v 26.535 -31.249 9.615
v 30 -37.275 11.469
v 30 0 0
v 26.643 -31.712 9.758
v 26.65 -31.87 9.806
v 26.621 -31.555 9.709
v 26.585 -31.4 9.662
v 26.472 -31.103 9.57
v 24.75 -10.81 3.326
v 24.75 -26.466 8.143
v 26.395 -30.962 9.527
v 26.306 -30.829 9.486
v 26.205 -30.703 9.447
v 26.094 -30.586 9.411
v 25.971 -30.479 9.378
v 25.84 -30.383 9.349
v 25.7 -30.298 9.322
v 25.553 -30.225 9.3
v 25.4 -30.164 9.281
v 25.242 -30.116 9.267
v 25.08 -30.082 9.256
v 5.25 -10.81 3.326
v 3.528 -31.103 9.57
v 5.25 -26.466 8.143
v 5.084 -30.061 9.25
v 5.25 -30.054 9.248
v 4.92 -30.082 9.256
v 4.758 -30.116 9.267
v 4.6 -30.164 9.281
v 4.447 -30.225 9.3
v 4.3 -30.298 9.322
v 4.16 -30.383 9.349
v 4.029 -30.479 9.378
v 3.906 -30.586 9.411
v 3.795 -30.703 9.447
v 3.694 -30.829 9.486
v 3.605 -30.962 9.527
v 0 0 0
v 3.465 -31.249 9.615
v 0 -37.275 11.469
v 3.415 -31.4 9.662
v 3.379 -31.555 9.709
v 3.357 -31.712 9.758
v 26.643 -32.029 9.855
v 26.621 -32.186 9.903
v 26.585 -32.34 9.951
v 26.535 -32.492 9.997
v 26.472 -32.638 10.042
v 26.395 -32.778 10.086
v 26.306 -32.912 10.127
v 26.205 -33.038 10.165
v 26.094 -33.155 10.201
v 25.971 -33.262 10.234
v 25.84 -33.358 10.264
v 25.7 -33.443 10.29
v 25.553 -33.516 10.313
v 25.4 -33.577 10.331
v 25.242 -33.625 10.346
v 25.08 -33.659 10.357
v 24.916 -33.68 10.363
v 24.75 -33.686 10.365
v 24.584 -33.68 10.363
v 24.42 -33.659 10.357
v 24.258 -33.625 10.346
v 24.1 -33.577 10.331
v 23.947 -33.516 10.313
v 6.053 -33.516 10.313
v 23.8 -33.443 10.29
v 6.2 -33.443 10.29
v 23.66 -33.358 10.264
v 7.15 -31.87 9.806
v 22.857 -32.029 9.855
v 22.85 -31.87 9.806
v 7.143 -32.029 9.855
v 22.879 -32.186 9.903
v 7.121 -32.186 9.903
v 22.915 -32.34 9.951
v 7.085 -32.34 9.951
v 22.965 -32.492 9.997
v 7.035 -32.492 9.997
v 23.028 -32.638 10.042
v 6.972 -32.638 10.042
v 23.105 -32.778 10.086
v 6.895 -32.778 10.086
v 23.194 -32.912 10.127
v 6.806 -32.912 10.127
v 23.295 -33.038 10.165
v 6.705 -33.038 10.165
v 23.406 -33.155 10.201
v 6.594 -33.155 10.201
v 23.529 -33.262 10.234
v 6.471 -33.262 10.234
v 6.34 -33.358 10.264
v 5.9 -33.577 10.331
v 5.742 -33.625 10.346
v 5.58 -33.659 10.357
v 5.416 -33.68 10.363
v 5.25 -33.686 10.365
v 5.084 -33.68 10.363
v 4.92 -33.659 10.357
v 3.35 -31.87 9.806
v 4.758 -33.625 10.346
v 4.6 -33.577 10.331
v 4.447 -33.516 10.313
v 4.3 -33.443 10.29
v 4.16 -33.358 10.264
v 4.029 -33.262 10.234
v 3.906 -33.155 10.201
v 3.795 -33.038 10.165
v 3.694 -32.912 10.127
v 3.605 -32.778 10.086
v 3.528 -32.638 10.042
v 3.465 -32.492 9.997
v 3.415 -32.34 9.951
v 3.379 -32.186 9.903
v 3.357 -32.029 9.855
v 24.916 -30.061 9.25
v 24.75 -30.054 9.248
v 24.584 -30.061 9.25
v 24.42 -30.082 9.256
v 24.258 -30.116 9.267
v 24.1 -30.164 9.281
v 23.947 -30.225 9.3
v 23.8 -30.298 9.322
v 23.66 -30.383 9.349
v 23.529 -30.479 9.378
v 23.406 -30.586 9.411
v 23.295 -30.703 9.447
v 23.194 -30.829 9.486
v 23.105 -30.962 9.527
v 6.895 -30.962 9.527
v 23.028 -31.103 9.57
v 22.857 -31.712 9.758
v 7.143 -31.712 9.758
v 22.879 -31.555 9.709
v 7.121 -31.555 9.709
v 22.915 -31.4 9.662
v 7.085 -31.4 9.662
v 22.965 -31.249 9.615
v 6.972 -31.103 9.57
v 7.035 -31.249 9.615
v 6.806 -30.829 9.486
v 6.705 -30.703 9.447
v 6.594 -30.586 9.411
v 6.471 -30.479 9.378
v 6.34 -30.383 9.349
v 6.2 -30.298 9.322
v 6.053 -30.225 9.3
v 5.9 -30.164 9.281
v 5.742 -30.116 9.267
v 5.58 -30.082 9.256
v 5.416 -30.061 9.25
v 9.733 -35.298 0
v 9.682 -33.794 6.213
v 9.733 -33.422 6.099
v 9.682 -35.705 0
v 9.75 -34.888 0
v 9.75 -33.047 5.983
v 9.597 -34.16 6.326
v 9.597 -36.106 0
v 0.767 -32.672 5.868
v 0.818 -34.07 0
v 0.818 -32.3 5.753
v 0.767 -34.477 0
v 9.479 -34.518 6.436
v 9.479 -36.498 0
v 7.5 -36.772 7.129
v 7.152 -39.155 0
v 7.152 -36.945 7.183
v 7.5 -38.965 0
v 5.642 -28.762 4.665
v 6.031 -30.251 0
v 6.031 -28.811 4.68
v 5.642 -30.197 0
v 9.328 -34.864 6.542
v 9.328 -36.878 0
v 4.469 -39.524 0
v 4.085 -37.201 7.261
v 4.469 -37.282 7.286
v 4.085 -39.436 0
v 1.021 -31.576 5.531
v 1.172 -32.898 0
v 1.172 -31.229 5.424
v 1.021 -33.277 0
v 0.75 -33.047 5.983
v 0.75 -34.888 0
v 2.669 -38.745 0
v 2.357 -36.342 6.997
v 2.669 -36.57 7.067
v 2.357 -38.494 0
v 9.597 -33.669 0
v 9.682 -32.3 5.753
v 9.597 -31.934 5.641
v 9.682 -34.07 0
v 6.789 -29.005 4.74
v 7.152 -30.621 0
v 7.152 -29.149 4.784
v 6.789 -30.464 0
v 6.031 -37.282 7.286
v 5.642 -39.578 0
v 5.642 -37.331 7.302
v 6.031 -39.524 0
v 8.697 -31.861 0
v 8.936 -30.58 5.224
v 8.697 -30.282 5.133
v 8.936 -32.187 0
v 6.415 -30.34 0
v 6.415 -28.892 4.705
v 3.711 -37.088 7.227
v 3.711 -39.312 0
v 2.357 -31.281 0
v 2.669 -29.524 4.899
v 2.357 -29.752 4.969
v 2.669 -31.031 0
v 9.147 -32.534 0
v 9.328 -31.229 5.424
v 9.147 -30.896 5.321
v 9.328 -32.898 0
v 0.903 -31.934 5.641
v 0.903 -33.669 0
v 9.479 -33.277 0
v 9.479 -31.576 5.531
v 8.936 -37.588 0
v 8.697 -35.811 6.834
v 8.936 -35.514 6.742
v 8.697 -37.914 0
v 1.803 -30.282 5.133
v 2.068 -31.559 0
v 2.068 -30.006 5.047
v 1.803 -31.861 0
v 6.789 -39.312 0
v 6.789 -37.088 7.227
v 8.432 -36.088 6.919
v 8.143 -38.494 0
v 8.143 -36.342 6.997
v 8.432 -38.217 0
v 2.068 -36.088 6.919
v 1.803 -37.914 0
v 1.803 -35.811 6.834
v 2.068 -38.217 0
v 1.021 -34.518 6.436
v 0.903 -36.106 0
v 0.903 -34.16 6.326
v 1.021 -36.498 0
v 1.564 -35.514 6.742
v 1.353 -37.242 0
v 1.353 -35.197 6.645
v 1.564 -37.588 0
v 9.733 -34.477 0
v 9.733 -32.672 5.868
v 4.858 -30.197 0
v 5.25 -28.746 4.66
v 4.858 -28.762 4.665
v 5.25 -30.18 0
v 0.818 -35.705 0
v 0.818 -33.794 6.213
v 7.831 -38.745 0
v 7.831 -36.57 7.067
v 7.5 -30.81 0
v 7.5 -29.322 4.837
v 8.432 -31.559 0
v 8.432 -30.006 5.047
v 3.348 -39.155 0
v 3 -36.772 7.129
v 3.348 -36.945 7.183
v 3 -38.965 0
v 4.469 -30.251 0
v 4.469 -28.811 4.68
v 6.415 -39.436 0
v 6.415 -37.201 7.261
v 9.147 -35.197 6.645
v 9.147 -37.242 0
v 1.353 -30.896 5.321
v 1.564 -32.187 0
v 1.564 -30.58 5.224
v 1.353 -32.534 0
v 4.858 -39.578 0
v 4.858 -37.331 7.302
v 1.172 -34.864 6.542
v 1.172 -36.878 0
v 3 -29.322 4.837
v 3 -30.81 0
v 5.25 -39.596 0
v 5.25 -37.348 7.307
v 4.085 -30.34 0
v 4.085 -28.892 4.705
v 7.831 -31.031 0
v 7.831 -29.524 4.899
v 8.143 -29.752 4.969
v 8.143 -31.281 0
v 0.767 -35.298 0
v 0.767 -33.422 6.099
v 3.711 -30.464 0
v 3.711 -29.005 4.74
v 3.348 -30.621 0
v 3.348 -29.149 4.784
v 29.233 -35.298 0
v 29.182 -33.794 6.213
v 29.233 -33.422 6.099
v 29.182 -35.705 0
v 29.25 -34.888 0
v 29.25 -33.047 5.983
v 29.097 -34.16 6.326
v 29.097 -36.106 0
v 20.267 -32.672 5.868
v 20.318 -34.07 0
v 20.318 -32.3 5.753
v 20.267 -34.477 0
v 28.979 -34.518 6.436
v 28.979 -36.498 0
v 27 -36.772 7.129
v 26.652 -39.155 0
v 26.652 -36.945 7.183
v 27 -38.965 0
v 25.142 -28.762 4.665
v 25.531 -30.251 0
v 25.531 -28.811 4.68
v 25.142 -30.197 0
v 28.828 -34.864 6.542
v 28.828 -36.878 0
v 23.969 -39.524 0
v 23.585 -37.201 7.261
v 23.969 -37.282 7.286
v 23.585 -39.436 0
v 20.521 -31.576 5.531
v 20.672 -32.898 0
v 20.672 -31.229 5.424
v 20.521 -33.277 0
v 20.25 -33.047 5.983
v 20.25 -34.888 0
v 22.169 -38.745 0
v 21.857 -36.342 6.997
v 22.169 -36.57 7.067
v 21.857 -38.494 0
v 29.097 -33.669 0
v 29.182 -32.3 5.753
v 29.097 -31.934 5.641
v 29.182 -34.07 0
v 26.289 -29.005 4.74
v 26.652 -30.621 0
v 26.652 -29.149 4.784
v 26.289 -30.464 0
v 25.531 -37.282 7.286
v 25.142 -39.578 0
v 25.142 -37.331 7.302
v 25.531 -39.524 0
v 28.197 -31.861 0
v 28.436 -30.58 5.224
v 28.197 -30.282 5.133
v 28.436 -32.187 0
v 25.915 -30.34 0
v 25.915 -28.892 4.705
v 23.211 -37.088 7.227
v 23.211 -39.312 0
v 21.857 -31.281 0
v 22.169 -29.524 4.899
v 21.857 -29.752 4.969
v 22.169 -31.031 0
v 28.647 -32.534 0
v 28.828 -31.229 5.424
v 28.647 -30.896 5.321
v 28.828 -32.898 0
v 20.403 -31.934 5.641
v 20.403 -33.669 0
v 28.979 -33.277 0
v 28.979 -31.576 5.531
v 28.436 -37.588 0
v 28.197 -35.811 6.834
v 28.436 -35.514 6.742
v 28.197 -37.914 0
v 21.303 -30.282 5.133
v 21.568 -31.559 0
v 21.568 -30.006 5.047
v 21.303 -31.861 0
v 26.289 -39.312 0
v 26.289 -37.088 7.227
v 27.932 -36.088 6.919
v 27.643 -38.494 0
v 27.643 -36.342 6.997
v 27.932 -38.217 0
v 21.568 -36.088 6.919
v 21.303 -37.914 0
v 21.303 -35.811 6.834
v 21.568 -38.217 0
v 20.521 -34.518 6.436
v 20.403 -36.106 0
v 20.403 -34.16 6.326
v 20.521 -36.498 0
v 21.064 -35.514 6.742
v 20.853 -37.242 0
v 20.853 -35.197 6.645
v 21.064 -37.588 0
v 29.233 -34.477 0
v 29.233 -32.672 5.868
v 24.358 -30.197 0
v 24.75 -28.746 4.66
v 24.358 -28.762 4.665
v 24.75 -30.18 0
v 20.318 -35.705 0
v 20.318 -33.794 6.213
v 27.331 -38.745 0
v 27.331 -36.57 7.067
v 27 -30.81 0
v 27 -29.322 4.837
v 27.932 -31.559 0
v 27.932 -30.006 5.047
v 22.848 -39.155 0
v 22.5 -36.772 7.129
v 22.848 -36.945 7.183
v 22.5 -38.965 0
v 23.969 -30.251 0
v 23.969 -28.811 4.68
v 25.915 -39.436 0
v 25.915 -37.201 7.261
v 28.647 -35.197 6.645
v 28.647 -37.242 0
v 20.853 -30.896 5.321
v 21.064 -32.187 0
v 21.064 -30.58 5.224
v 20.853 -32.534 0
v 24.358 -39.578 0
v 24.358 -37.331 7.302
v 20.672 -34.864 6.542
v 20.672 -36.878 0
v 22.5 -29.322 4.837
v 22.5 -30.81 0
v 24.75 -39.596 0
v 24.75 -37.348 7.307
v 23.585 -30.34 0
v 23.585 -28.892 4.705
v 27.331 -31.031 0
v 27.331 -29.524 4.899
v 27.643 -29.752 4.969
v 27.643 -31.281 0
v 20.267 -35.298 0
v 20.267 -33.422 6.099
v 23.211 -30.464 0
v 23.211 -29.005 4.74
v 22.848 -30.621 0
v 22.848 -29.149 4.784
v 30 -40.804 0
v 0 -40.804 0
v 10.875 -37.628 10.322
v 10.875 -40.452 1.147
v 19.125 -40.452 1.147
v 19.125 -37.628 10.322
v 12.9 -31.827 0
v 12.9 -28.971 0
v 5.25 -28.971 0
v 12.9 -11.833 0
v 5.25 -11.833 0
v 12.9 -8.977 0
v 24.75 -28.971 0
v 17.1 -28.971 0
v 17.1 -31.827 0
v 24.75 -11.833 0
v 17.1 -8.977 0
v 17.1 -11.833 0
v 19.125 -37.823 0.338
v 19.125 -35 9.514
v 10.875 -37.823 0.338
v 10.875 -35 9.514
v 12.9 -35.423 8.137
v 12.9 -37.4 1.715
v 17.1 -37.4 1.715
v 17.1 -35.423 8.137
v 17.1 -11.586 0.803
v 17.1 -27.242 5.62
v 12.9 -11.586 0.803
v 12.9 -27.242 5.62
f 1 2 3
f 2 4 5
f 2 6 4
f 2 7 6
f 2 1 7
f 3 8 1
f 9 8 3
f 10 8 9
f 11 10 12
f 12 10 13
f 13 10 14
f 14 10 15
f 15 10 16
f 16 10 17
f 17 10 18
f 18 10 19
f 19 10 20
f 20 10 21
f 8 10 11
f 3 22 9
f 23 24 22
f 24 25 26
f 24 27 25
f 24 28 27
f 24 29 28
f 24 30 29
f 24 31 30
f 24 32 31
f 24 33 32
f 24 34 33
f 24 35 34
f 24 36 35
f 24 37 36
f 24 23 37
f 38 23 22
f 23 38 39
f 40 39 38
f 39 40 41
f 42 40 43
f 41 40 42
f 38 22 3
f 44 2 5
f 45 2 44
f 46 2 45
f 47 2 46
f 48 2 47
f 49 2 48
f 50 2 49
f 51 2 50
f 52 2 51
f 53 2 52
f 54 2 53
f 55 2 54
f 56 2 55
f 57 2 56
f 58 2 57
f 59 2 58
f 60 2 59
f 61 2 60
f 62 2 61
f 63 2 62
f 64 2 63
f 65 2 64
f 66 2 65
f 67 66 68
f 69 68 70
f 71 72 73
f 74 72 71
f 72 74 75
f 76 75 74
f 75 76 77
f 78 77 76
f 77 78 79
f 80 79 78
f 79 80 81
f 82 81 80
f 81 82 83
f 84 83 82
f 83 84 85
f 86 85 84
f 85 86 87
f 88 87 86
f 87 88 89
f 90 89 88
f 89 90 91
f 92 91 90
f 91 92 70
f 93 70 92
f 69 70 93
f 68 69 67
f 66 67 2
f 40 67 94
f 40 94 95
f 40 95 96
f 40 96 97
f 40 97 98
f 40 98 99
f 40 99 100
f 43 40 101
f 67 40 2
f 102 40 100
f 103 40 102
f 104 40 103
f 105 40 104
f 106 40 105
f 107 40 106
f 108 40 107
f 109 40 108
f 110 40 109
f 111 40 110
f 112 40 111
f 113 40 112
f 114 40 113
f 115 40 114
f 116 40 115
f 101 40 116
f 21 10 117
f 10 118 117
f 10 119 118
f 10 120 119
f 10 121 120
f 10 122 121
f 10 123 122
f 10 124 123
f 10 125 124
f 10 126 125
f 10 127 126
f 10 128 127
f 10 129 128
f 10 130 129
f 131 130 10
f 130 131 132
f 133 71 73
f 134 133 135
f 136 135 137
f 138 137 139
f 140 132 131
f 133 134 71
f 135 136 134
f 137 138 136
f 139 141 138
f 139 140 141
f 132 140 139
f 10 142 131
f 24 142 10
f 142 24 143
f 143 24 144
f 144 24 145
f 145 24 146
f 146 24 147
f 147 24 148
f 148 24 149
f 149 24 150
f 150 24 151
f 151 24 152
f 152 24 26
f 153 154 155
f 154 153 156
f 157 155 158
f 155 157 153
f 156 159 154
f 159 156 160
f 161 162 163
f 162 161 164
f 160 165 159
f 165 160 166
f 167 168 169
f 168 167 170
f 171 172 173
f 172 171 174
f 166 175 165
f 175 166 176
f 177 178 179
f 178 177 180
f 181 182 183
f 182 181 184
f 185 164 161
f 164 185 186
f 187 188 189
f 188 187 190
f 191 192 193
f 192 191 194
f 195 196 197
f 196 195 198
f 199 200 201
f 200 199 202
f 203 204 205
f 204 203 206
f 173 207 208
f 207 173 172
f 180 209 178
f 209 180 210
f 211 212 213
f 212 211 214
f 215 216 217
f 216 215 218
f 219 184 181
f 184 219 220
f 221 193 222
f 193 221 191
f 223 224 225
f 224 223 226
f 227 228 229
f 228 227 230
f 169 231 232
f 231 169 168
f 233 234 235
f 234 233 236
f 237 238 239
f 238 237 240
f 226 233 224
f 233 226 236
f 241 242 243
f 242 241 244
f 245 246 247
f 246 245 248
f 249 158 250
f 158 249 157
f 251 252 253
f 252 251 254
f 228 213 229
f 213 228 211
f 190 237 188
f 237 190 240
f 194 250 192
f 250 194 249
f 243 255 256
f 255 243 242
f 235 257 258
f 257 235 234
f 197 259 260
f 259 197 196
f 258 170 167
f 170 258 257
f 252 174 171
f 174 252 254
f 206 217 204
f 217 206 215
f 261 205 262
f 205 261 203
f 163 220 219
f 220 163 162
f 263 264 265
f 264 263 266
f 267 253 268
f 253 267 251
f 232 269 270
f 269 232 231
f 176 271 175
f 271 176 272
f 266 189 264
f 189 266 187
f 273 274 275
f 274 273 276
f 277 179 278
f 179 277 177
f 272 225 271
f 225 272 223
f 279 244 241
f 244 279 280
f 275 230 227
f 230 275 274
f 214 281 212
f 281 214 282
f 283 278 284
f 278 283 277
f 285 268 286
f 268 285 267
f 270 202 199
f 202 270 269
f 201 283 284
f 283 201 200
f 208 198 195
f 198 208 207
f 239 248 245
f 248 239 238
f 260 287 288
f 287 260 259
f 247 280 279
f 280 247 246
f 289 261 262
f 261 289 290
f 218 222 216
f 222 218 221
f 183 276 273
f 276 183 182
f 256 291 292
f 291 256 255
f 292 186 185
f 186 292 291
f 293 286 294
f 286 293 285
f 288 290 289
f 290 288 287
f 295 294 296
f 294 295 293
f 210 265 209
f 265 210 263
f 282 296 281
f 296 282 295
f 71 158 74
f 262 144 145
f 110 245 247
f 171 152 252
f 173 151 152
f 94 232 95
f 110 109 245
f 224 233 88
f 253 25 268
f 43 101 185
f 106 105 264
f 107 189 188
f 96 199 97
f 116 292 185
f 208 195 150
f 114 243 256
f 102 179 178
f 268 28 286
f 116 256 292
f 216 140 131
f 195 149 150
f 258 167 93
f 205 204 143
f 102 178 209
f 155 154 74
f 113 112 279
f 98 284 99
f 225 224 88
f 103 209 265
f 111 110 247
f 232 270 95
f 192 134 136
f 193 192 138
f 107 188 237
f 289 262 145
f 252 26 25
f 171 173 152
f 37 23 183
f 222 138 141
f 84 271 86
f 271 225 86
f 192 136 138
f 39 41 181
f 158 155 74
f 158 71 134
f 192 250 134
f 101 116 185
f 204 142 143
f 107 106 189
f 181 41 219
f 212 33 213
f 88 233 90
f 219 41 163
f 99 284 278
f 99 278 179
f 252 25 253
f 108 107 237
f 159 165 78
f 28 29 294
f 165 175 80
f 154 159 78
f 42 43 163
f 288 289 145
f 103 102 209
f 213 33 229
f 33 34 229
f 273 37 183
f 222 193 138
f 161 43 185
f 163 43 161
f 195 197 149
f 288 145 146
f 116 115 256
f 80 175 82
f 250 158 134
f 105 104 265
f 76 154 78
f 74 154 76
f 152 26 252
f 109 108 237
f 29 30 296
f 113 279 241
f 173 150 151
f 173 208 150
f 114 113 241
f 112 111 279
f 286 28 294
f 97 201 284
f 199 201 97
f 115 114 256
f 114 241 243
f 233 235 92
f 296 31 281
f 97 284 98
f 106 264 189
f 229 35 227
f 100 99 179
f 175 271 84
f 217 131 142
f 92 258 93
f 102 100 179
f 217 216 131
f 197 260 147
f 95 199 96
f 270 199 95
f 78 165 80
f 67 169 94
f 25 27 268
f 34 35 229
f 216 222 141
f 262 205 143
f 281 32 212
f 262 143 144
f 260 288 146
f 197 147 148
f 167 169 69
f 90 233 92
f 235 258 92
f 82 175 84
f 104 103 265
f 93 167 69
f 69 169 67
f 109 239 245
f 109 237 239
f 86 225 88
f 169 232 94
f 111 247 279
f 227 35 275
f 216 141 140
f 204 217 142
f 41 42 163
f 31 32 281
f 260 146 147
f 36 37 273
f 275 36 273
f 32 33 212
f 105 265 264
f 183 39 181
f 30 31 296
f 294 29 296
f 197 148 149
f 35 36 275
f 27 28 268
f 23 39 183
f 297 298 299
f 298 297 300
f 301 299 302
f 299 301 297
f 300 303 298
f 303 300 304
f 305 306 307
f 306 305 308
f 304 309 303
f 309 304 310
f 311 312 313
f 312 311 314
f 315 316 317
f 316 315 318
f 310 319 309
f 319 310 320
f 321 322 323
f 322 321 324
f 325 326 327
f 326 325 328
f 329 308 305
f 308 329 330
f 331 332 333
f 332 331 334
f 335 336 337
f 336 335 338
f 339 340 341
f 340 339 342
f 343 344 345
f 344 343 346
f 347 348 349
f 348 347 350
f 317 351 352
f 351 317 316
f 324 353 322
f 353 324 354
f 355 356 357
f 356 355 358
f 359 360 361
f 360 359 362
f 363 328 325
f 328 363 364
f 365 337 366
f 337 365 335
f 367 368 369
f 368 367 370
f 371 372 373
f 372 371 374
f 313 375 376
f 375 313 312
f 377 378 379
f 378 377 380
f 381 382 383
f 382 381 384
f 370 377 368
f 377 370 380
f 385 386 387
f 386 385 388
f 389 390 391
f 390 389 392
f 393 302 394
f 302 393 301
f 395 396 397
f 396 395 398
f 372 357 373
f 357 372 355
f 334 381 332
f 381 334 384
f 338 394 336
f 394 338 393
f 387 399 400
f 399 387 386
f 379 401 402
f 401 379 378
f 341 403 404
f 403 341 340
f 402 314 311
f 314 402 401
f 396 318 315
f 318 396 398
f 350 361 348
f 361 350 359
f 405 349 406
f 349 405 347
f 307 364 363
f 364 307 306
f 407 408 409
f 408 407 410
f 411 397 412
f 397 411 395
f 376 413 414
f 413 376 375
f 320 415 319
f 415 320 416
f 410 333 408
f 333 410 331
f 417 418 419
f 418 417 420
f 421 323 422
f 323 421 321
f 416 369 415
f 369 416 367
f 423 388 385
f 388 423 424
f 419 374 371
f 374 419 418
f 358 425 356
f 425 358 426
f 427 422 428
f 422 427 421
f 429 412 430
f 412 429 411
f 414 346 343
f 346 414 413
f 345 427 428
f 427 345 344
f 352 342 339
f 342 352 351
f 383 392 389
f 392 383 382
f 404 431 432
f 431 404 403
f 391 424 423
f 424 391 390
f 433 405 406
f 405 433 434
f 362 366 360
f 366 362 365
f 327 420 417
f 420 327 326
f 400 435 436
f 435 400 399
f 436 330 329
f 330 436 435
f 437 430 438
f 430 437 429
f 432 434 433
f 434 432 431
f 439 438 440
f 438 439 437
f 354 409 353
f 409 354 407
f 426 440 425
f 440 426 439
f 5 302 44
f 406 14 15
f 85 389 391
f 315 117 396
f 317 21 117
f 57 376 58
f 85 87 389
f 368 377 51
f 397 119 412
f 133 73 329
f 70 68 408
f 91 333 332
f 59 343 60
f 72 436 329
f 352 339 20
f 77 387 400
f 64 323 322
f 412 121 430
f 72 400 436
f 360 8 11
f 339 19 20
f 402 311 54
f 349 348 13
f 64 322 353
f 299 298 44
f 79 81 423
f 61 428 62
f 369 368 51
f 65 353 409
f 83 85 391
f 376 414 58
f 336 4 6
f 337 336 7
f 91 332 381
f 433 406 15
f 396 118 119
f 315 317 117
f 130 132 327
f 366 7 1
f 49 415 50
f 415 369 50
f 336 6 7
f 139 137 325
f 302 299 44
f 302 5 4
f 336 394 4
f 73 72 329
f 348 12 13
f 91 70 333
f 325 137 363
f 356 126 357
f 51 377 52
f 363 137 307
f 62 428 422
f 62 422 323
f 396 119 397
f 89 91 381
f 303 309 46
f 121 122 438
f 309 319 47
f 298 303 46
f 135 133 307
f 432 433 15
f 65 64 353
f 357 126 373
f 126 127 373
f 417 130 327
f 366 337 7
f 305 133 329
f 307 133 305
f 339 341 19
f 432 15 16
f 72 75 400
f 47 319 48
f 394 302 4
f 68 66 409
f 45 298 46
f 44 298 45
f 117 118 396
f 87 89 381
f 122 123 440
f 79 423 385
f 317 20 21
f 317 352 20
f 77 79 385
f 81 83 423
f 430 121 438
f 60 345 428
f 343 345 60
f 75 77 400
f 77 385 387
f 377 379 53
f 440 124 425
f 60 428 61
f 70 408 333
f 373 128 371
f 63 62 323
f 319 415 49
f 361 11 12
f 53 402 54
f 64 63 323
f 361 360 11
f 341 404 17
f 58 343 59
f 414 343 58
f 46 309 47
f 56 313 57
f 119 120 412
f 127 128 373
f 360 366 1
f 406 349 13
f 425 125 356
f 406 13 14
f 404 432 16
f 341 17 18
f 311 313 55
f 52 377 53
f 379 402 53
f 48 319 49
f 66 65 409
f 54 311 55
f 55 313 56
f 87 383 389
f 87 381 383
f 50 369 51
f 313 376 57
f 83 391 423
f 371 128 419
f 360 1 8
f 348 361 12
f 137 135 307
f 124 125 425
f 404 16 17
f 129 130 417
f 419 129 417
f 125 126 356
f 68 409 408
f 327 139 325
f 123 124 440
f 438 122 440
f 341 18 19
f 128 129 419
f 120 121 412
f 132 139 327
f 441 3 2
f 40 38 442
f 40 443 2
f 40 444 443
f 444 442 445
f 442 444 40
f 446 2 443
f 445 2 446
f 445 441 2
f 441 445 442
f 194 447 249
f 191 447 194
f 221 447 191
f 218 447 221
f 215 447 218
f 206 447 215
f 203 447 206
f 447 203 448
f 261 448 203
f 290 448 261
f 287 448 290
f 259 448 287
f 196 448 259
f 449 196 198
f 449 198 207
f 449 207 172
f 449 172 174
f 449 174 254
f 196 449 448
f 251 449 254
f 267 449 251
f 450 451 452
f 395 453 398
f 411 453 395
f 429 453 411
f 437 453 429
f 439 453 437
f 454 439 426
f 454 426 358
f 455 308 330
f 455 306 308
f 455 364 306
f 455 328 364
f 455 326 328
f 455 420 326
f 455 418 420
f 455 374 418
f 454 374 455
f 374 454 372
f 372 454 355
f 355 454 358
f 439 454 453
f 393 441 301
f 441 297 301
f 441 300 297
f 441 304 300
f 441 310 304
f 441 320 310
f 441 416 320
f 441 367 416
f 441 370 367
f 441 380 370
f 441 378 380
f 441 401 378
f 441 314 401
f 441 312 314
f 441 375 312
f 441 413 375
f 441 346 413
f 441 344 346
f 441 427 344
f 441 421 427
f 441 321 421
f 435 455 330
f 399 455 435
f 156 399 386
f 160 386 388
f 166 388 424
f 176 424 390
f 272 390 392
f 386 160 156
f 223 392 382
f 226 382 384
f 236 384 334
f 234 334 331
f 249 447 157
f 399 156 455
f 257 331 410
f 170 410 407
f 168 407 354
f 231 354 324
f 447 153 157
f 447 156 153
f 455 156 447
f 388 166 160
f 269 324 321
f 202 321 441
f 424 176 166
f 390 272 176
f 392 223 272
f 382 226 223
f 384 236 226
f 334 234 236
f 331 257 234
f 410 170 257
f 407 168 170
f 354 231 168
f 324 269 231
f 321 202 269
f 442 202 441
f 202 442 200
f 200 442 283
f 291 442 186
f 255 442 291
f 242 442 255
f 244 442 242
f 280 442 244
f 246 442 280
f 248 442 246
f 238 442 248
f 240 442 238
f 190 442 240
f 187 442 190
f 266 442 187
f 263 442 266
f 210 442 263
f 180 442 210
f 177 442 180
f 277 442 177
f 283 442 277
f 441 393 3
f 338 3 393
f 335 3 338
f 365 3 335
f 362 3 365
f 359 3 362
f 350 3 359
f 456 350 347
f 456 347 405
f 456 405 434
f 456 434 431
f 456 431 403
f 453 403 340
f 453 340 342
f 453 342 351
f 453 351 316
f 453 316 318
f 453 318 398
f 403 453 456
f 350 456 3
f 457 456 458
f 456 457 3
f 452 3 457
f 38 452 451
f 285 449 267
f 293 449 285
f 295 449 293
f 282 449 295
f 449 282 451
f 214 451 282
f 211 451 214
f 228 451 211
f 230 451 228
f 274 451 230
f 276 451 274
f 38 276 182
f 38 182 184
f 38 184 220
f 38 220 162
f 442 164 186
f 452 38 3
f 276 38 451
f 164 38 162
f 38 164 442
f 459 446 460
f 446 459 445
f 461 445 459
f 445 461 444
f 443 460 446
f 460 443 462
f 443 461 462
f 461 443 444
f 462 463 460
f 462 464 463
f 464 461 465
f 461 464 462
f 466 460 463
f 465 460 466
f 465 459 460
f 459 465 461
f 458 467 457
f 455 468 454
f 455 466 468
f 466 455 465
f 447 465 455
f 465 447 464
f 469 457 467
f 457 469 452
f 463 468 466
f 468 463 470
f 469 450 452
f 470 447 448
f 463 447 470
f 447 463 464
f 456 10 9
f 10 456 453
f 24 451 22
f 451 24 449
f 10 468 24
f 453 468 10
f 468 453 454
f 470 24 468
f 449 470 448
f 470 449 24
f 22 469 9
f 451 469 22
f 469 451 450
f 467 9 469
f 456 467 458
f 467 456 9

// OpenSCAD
// Width of cross-section
width = 30;
// Length - bolt will need to be this long. 52=2" 39=1.5 26=1"
length = 39;
// Minimum height - by tightening bolt, can increase up to about 125% of this value
min_height = 12;
// Attachment screw holes (to secure wedge to work)
attachment_holes = 2; // [0,2,4]
// Attachment screw head type (mushroom=pan head)
attachment_head_type = "bugle"; // [bugle,mushroom]

/* [Advanced] */
// Slot width (should fit flat to flat dimension of hex nut) - 8.2mm for #6 (US), 7.4mm for M4
slot_width = 8.25;
// Slot depth - must accommodate greater of bolt head height and nut height. May need to be greater for steeper gradient
slot_depth = 2.75;
// Ratio of slot height to minimum height
slot_height_ratio = 0.8;
// Bolt width
bolt_width = 4.2;
// Bolt slot height as ratio of slot height
bolt_slot_height_ratio = 0.7;
// Ratio of center hole width to overall
center_hole_ratio_w = 0.65;
// Ratio of center hole length to overall
center_hole_ratio_l = 0.42;
// Number on build plate
number_on_plate = 1; // [1,2]
// Arrangement of multiple pieces on build plate
multiple_arrangement = "sidebyside"; // [sidebyside,endtoend]
// Attachment hole screw shaft width; 3.8 for #8, 4.8 for #10
attachment_shaft_width = 3.8;
// Attachment hole taper height for bugle head
attachment_taper_height = 4;
// Attachment hole taper top diameter; #8 woodcraft screws use 8.2, common wood screws closer to 9.0, #10 9.8
attachment_taper_top_diameter = 9.0;

/* [Hidden] */
hypotenuse = sqrt(length*length + min_height*min_height);

adjustable_shim();

if (number_on_plate > 1)
{
  if (multiple_arrangement == "sidebyside")
  {
	translate([-2,-hypotenuse,0]) rotate([0,0,180]) adjustable_shim();
  }
  if (multiple_arrangement == "endtoend")
  {
	translate([width,-2.05*hypotenuse,0]) rotate([0,0,180]) adjustable_shim();
  }
}

// Produce a single shim, printing with hypotenuse down
module adjustable_shim()
{
  assign( angle = atan(min_height/length), slot_height = min_height * slot_height_ratio ) render( convexity = 5 )
  {
    rotate([180-angle,0,0])
    difference()
    {
	  // Basic rectangle
	  cube(size=[width,length,min_height], center=false);
	  // Subtract half to make wedge
     rotate([angle,0,0]) cube(size=[width,hypotenuse,min_height], center=false);
	  // Subtract larger slot from end
	  translate([(width-slot_width)/2,length-slot_depth,min_height*(1.0-slot_height_ratio)/2]) cube(size=[slot_width, slot_depth, slot_height], center=false);
	  // Subtract bolt (via) slot
	  translate([(width-bolt_width)/2,0,(min_height-bolt_slot_height_ratio * slot_height)/2]) cube(size=[bolt_width, length, bolt_slot_height_ratio * slot_height], center=false);
	  // Create center hole so we can secure fasteners through this
	  translate([(1-center_hole_ratio_w)*width/2,(1-center_hole_ratio_l)*length/2,0]) cube(size=[width*center_hole_ratio_w, length*center_hole_ratio_l, min_height], center=false);
	  // Optional attachment screw holes
	  attachment_screws();
    }
  }
}

// Generate 2 or 4 attachment screw holes
module attachment_screws()
{
  if (attachment_holes >= 2) assign( margin_side = width * (1.0 - center_hole_ratio_w), margin_end = length * (1.0 - center_hole_ratio_l) )
  {
	 translate( [margin_side / 2, length - margin_end / 4, 0 ] ) attachment_hole();
	 translate( [width - margin_side / 2, length - margin_end / 4, 0 ] ) attachment_hole();
	 if (attachment_holes >= 4)
    {
	 	// At the thin end, mushroom heads will be on a slant
		 translate( [margin_side / 2, margin_end / 2, 0] ) attachment_hole();
		 translate( [width - margin_side / 2, margin_end / 2, 0] ) attachment_hole();
    }
  }
}

// Generate a single untranslated attachment hole
module attachment_hole()
{
  if (attachment_head_type == "bugle")
  {
	attachment_hole_bugle();
  }
  if (attachment_head_type == "mushroom")
  {
	attachment_hole_mushroom();
  }
}

// Taper head (bugle) attachment hole
module attachment_hole_bugle()
{
  union()
  {
   attachment_hole_mushroom();
	cylinder( r1 = attachment_shaft_width / 2, r2 = attachment_taper_top_diameter / 2, h = attachment_taper_height, $fn = 72 );
  }
}

// Pan head (mushroom) attachment hole
module attachment_hole_mushroom()
{
  union()
  {
    cylinder( h = min_height, r = attachment_shaft_width / 2, center = false, $fn = 72 );
    translate([0,0,attachment_taper_height]) cylinder(h = min_height, r = attachment_taper_top_diameter / 2, center = false, $fn = 72 );
  }
}
